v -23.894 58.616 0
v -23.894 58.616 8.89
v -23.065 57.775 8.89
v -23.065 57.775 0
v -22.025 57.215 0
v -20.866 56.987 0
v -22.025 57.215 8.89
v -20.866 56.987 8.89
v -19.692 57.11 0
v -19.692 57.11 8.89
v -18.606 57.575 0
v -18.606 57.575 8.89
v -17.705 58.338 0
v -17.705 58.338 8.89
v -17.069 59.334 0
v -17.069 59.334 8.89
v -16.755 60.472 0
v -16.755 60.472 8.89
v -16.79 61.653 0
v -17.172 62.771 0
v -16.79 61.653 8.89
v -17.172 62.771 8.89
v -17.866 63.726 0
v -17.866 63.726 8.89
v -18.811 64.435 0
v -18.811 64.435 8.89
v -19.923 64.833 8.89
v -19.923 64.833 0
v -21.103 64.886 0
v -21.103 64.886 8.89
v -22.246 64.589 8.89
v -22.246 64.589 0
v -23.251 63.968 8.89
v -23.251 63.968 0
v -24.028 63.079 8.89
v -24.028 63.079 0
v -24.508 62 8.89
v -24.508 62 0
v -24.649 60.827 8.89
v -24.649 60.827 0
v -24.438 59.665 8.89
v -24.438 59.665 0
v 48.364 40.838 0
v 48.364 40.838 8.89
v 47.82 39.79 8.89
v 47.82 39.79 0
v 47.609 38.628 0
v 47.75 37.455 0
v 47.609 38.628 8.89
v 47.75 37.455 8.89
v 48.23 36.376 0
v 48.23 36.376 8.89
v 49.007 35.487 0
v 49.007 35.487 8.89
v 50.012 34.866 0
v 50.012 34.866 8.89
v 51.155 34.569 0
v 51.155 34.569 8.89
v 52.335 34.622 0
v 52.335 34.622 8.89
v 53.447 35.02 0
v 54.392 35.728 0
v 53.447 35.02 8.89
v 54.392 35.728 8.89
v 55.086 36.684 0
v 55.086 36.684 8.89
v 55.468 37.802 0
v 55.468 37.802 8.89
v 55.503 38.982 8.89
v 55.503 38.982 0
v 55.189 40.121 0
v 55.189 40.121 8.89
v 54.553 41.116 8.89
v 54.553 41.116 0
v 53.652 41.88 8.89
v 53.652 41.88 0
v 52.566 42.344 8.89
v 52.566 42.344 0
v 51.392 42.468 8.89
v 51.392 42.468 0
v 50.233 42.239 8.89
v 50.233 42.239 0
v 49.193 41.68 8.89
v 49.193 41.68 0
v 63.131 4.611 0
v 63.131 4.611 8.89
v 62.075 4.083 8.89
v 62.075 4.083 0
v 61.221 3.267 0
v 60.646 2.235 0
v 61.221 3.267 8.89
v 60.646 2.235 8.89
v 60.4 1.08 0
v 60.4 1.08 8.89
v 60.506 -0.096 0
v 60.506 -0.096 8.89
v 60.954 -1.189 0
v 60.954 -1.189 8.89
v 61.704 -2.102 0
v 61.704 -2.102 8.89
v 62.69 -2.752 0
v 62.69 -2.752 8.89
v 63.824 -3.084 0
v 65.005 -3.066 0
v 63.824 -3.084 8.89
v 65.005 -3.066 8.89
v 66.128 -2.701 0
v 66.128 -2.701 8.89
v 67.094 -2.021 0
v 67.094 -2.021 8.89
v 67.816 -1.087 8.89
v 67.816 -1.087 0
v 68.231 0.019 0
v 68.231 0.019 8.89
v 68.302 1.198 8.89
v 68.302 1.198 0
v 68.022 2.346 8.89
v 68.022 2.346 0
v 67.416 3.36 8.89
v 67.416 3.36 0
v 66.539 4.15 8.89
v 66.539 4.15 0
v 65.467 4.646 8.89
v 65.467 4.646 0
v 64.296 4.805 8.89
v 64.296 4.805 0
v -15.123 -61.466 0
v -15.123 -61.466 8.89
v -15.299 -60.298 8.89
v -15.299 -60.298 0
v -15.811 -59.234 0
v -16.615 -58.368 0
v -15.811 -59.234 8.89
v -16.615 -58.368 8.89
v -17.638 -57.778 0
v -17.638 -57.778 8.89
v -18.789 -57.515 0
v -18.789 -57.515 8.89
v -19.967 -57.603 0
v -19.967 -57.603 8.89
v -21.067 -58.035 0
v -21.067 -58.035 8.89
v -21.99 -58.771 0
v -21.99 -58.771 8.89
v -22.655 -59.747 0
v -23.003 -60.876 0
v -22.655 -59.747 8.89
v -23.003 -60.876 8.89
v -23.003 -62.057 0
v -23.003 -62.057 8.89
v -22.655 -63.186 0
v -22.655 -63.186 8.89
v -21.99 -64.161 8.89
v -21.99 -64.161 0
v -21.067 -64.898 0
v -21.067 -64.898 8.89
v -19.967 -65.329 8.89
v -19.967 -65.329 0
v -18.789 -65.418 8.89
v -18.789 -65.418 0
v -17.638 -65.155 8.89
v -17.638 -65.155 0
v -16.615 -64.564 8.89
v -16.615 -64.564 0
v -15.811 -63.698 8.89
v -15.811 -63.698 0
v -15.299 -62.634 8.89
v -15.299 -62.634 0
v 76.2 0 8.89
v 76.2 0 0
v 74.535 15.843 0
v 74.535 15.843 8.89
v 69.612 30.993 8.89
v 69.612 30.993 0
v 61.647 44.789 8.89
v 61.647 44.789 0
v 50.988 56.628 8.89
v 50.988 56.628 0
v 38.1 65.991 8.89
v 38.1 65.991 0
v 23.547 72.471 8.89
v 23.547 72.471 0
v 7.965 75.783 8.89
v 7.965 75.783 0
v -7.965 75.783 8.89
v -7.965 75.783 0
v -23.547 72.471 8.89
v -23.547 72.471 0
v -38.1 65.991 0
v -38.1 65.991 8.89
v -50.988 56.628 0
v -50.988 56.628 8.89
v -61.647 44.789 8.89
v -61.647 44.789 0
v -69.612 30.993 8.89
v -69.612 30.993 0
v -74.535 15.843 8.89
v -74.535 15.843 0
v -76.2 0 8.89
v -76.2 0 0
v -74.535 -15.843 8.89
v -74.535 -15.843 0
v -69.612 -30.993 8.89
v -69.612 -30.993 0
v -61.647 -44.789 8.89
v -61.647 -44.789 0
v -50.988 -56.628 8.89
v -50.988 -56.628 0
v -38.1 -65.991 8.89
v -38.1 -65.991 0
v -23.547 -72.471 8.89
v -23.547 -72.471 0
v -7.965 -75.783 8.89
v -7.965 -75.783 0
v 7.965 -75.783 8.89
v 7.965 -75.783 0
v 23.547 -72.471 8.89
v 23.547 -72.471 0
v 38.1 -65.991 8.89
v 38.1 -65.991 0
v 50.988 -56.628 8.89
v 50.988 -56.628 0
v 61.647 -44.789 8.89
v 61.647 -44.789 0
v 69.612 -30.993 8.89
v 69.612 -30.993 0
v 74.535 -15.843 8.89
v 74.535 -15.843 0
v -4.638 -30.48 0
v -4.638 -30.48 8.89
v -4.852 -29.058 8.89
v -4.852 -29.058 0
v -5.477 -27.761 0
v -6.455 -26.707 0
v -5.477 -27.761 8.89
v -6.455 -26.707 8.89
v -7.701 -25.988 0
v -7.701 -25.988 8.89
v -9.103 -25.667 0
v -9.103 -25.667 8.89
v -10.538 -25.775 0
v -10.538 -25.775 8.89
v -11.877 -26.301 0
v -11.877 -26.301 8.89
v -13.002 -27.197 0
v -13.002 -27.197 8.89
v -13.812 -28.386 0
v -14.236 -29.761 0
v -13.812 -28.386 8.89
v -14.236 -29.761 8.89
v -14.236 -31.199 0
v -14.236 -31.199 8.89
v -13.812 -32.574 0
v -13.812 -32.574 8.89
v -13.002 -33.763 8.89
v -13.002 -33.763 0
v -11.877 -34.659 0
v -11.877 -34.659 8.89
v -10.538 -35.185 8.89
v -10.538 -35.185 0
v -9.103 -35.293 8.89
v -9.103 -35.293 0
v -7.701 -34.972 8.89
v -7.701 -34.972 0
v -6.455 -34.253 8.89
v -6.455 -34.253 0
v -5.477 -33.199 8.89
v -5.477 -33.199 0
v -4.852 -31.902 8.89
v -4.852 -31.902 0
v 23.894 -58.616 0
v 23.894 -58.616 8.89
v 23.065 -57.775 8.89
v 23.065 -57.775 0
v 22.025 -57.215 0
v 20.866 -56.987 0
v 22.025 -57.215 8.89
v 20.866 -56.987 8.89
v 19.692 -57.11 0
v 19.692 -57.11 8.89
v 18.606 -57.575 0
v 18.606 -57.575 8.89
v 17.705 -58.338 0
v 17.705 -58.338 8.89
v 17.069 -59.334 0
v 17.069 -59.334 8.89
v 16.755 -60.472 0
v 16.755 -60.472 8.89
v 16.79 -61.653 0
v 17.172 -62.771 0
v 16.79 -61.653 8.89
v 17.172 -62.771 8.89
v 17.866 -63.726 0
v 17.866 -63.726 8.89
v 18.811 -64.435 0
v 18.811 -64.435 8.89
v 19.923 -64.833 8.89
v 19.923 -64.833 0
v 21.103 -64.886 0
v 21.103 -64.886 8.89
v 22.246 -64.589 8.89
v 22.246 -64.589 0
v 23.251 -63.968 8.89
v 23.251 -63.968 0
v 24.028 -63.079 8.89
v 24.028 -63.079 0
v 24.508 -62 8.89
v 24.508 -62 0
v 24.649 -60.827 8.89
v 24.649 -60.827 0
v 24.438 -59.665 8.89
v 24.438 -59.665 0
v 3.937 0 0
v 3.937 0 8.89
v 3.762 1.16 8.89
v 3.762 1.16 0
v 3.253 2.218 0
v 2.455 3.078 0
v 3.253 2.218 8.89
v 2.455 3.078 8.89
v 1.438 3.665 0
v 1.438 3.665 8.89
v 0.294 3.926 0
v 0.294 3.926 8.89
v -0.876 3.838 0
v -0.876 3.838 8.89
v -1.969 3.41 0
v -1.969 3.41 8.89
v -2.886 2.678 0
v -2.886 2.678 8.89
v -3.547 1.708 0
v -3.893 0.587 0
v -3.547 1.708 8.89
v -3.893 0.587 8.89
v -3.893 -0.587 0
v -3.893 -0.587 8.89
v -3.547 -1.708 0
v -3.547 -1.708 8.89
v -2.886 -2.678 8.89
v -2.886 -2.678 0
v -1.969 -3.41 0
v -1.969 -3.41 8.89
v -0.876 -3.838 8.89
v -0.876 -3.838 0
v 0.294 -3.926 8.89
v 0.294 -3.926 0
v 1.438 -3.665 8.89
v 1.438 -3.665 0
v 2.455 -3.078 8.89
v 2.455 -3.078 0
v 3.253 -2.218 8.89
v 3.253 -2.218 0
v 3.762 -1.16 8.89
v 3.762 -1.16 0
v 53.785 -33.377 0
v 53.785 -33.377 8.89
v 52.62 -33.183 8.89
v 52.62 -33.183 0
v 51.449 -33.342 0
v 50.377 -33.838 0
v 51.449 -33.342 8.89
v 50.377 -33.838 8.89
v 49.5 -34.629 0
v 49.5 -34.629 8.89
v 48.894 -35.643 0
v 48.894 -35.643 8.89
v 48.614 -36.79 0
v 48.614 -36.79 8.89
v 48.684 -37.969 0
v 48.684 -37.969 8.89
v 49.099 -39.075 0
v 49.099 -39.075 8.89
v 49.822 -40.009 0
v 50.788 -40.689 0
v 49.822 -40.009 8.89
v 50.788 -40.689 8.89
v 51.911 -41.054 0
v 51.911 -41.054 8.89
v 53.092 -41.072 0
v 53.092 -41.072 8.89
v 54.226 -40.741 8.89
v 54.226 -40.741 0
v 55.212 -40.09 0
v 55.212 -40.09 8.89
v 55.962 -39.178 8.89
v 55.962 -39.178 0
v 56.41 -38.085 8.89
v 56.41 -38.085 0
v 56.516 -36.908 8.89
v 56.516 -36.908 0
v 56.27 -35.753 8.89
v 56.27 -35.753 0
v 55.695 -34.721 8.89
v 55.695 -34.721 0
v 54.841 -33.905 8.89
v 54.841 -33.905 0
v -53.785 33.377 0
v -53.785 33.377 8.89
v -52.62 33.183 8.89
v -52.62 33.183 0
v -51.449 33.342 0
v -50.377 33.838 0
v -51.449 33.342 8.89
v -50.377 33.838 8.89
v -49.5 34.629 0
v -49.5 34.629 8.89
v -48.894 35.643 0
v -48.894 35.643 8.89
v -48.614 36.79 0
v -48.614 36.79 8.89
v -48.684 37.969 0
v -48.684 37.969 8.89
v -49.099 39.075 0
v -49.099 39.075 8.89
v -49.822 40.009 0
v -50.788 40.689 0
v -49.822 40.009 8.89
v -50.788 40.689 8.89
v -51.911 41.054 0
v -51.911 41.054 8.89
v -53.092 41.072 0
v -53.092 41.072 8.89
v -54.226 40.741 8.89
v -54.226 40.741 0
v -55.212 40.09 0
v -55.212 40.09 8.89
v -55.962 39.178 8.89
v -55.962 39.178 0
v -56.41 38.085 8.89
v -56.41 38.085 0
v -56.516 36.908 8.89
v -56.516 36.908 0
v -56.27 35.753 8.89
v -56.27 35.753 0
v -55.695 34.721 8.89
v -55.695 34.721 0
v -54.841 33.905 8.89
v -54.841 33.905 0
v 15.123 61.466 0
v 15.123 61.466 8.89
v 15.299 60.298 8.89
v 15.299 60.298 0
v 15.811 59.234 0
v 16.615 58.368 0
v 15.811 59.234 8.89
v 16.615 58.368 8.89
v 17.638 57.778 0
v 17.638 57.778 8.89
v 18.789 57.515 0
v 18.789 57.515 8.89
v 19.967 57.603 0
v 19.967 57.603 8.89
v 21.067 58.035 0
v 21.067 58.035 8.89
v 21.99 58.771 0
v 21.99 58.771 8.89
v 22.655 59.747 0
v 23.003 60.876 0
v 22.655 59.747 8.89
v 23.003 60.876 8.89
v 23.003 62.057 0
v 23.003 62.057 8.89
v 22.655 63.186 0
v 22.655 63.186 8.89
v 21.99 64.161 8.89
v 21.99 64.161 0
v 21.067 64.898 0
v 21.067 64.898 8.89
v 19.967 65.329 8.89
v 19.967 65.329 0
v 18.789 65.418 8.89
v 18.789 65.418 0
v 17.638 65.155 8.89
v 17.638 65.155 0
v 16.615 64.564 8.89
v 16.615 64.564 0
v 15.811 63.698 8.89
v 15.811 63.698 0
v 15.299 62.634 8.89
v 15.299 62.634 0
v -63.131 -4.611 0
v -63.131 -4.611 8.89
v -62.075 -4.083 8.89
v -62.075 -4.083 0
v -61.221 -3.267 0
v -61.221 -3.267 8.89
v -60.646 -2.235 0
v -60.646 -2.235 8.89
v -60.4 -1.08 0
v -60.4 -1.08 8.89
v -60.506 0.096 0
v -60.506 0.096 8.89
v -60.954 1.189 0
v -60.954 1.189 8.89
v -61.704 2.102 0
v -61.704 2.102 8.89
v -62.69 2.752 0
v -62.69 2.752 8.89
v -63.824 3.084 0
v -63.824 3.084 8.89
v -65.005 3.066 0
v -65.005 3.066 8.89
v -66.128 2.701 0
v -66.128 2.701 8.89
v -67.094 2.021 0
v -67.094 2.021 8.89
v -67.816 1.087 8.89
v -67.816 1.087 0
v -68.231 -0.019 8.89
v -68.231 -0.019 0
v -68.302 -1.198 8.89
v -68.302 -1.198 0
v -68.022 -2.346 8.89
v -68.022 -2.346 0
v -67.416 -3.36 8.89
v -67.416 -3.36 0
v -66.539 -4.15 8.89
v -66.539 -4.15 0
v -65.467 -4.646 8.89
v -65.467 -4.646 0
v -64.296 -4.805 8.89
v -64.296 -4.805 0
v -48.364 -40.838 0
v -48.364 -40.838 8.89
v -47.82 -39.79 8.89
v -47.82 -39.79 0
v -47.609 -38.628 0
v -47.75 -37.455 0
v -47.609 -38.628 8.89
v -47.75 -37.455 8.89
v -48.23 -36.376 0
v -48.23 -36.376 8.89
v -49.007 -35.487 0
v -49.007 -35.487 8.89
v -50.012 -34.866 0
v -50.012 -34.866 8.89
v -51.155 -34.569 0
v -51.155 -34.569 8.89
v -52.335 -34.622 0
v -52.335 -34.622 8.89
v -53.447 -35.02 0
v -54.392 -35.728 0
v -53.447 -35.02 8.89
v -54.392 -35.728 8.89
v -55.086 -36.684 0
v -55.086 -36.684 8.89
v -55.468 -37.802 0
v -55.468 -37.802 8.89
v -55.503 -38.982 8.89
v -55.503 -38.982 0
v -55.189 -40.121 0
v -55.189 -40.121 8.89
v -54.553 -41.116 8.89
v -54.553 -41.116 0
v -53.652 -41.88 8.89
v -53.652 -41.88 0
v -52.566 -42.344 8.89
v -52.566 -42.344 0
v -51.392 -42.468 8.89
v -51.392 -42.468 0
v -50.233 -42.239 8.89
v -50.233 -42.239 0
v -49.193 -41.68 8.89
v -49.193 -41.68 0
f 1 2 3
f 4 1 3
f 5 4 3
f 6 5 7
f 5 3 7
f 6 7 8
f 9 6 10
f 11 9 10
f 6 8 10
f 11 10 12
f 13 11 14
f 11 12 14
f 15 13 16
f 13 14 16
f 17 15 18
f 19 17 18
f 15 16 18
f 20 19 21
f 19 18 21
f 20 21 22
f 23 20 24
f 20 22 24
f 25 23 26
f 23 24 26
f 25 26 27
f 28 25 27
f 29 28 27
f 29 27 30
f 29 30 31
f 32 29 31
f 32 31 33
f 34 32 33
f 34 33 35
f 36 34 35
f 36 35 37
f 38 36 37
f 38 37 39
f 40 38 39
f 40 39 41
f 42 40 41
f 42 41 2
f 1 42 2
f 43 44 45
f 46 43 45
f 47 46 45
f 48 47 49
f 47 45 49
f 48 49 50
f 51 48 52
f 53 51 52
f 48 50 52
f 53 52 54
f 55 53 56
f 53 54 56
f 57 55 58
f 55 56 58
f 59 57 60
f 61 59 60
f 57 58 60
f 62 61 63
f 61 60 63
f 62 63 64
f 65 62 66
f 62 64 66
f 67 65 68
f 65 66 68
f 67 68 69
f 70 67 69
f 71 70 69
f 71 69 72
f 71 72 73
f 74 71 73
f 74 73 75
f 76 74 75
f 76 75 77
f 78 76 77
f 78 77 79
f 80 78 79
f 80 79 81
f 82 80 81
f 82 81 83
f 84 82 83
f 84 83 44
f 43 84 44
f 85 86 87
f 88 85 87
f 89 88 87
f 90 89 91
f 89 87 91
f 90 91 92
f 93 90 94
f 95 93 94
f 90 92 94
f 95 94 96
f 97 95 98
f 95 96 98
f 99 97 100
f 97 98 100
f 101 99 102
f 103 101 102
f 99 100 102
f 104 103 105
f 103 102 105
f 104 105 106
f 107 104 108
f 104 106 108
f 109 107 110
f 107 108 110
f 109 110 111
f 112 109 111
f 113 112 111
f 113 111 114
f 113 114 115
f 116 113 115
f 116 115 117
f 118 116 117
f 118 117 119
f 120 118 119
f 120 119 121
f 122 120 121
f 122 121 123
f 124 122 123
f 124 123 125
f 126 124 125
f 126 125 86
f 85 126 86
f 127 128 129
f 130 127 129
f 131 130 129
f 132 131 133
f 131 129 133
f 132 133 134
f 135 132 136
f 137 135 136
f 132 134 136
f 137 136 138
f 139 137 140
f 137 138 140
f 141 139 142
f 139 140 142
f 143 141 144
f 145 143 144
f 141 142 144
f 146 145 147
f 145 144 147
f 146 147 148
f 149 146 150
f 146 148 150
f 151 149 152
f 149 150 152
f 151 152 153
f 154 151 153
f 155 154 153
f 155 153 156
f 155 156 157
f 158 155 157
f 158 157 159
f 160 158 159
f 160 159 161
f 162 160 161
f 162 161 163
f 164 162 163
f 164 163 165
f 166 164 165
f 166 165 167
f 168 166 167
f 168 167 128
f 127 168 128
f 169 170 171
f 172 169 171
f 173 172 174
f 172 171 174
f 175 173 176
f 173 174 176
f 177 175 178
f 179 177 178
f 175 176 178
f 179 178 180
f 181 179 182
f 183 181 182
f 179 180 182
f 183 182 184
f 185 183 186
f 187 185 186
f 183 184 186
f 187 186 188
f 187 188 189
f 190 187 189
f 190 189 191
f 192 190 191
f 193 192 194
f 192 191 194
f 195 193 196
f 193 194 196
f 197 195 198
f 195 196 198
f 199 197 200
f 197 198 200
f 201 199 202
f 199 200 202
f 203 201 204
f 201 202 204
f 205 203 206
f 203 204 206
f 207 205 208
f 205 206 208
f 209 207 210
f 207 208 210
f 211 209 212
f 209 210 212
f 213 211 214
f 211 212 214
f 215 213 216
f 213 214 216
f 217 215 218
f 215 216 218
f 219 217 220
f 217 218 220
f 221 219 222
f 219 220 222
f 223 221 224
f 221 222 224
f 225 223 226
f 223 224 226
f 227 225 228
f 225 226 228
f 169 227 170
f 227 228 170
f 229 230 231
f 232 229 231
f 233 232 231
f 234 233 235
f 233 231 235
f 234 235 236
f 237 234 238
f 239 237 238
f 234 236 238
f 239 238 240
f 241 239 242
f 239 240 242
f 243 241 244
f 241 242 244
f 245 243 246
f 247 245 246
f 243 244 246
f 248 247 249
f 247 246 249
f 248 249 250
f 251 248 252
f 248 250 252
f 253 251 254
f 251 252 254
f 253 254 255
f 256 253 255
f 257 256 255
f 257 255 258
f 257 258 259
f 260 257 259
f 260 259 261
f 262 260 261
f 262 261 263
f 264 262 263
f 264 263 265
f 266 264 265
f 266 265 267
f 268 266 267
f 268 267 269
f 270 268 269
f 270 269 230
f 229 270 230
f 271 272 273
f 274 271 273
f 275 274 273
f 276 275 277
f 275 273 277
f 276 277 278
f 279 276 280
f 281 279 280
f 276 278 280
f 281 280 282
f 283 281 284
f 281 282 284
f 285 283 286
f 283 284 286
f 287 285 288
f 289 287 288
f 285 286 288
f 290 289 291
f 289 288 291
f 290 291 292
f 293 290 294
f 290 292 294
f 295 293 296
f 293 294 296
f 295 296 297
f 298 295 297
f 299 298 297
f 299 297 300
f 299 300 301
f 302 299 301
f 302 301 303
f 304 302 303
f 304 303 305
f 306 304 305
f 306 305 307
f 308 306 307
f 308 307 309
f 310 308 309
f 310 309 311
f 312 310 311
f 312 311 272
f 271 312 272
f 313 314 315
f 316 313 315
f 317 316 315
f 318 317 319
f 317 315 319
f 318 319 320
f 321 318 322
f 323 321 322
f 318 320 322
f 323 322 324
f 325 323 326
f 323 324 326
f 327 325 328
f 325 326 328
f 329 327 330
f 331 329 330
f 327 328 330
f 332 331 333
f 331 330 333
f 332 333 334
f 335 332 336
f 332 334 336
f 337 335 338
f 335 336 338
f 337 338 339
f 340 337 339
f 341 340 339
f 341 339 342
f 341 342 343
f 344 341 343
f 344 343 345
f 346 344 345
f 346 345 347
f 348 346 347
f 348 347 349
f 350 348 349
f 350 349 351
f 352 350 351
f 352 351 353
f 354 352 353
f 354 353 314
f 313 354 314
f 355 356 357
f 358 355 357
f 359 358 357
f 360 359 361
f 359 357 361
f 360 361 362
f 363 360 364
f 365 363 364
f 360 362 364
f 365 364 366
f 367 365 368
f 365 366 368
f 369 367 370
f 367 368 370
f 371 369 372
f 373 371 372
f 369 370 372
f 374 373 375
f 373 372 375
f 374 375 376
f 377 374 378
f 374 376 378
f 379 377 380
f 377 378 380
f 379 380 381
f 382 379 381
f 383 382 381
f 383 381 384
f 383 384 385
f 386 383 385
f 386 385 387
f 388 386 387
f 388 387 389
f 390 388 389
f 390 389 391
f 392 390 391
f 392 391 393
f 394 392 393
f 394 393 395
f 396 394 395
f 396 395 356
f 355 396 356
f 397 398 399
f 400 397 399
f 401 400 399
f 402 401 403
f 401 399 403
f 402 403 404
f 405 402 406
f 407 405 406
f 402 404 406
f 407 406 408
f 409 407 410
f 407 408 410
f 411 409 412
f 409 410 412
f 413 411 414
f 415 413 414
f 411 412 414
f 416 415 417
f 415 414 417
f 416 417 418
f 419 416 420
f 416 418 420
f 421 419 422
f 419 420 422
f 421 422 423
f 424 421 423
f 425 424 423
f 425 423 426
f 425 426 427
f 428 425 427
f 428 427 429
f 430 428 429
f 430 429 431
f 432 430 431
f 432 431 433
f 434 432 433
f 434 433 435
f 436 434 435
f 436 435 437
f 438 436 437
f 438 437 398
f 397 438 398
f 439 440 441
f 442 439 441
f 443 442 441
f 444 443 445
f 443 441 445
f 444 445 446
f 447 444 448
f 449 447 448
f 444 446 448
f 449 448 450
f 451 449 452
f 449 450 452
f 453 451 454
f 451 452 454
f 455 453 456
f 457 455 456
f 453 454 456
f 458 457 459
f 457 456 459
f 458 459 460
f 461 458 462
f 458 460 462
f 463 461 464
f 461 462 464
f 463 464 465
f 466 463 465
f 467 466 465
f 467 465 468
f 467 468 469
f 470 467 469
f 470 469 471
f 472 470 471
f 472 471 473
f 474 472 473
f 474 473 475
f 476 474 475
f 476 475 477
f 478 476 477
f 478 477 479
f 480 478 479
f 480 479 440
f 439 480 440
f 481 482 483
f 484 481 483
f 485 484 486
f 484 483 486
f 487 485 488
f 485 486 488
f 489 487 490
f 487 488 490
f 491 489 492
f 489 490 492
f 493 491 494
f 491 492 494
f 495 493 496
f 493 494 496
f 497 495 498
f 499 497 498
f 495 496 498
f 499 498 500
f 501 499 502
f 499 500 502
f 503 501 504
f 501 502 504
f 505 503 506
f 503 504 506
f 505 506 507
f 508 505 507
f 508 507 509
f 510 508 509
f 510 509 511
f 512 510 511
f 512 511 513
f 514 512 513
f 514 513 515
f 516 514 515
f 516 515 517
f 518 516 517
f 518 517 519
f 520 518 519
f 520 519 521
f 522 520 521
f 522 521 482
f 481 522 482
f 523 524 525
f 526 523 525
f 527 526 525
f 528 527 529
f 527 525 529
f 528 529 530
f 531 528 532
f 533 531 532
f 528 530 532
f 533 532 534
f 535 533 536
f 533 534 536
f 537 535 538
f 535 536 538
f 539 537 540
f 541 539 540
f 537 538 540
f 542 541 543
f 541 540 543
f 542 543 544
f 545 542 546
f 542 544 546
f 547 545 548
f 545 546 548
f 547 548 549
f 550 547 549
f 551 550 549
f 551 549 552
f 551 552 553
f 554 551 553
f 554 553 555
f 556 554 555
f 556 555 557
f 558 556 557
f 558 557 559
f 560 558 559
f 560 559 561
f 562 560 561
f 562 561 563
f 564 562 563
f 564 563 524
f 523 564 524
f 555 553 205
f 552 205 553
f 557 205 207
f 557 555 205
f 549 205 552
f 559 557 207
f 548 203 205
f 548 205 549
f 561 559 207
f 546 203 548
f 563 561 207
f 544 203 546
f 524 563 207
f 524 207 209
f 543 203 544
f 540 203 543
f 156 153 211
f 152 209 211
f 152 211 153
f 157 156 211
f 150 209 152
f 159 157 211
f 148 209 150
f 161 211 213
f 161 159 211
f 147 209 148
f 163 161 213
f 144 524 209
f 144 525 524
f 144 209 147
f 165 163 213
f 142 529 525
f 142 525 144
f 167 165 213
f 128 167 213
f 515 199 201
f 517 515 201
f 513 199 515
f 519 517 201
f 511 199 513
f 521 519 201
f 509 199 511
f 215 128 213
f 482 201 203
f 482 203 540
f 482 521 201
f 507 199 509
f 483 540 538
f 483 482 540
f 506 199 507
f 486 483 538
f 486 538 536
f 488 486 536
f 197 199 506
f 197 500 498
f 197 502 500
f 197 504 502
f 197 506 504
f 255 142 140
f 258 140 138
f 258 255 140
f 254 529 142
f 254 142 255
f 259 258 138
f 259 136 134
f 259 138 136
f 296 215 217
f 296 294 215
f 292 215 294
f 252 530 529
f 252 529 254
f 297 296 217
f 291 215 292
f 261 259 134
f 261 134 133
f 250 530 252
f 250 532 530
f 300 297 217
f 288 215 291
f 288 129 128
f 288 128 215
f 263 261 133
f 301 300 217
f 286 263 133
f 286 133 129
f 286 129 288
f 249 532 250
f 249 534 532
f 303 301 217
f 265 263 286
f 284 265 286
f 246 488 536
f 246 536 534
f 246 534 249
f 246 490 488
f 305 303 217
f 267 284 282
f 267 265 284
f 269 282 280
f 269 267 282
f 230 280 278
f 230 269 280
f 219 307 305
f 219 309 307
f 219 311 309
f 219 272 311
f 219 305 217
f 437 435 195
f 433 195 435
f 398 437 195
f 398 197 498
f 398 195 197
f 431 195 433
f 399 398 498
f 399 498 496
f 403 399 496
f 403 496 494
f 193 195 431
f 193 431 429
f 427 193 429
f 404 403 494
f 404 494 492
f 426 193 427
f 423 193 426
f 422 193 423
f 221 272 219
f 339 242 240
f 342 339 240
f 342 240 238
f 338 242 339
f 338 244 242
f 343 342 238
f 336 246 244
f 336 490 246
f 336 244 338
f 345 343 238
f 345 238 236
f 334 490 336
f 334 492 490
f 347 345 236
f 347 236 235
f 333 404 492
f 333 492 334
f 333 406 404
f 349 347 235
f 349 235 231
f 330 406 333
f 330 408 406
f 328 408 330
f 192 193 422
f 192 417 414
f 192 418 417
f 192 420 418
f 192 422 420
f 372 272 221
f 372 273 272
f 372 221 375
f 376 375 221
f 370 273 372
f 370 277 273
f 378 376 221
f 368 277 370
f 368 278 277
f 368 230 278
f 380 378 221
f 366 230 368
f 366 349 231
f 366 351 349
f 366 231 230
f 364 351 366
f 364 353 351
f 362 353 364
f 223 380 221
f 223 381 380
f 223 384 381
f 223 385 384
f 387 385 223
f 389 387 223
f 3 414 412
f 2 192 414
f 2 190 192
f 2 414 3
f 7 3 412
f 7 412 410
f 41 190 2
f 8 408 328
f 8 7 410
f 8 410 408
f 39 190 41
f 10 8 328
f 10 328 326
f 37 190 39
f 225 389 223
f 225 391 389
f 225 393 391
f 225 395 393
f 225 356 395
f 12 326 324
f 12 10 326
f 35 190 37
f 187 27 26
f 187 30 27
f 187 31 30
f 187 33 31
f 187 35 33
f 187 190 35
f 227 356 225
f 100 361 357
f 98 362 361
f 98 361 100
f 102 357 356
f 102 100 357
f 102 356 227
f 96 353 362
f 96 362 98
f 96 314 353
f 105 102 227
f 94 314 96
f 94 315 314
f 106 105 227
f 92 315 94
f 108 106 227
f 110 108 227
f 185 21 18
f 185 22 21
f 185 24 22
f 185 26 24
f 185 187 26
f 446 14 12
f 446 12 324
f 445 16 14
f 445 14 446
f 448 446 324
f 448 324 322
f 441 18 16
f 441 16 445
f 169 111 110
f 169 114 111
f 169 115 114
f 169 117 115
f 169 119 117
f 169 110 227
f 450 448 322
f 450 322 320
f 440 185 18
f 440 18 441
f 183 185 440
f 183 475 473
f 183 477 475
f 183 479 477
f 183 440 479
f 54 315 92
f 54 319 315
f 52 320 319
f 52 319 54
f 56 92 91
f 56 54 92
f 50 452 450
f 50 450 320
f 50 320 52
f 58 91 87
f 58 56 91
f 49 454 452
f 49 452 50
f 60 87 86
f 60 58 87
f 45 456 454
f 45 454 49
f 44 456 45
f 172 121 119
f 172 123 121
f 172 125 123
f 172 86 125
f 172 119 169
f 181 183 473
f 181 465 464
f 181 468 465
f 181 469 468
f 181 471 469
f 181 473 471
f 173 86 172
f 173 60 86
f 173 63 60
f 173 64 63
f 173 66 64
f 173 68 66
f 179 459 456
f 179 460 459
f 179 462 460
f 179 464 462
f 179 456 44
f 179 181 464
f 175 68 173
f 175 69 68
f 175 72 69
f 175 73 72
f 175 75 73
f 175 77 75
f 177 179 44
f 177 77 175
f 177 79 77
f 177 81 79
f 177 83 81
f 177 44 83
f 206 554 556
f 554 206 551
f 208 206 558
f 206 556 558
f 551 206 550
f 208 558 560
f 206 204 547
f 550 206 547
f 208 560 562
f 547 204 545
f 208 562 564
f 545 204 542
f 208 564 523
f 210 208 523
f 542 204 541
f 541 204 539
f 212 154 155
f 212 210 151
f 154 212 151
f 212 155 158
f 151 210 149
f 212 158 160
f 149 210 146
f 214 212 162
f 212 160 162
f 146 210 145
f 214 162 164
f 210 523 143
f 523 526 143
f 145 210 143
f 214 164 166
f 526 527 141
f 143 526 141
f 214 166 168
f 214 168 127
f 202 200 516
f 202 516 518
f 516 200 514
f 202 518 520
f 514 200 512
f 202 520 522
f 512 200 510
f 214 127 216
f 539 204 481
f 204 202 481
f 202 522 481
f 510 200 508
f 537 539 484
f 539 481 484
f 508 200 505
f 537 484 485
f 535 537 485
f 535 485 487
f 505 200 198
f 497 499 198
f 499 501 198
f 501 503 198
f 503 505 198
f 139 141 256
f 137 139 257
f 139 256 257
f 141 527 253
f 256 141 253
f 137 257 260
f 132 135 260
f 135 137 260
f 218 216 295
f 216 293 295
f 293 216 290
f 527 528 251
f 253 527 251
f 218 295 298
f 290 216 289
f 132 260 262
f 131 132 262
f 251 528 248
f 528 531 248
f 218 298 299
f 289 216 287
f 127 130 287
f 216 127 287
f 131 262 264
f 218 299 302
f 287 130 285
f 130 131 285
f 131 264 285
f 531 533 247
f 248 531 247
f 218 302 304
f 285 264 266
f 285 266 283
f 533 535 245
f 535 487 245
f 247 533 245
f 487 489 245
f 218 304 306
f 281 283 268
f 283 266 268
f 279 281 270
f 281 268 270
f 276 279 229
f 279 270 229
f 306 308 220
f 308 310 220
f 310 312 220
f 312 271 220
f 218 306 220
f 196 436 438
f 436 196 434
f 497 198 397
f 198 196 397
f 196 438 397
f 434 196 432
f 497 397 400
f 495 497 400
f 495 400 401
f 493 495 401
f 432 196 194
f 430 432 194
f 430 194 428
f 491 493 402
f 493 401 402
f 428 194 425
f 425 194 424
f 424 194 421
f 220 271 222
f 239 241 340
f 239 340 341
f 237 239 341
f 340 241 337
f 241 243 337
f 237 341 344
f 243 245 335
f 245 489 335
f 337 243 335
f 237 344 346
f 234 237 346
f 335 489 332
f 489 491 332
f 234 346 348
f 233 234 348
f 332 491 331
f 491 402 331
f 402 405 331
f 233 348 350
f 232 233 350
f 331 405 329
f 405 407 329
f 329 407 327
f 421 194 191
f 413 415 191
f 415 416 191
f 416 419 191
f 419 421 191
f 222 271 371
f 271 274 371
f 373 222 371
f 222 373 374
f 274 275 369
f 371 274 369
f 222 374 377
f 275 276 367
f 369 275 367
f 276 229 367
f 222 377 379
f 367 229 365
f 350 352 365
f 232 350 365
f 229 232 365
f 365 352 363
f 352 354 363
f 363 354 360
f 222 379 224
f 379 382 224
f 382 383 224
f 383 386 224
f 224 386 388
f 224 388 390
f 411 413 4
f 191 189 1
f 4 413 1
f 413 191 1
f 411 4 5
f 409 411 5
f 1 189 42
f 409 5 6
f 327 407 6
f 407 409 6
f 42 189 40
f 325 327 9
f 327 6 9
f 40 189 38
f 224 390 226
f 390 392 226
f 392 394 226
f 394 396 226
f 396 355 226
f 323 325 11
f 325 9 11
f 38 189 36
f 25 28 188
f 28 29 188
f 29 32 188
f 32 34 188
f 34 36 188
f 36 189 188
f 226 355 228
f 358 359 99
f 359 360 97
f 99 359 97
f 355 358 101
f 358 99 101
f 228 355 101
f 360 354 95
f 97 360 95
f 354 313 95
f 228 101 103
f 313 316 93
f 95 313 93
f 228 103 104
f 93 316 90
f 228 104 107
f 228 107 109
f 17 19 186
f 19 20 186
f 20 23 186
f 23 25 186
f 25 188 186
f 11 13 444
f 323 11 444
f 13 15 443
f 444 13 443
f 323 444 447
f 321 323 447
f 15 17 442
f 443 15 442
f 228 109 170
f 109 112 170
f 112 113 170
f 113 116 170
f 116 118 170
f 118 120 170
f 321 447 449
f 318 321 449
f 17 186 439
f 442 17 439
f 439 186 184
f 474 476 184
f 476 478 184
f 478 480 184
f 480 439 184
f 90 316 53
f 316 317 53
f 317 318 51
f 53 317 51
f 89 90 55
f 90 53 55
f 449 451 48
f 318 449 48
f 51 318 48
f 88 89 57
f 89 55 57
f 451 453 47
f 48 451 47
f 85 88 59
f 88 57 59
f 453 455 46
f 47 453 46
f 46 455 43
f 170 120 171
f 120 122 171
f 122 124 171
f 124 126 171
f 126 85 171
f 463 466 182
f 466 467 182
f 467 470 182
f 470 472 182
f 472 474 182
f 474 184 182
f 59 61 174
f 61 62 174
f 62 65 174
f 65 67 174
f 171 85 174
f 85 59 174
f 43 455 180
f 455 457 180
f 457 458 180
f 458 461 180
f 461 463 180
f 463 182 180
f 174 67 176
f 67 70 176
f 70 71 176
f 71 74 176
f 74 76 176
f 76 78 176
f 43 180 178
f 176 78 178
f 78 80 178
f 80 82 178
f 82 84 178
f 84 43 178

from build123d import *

# Parameters (mm, degrees)
F0_R            = 76.2
F1_DEPTH        = 8.89
F2_R            = 3.937
F3_DEPTH        = 25.4
F4_R            = 4.826
F5_DEPTH        = 25.4
F6_R            = 3.9624
F7_DEPTH        = 25.4
F7_COPIES_COUNT = 10


# Not quite as in the source:
# - a pattern or mirror of a feature is missing from the dataset's text; its kind, count and spacing are read off the source's solid


with BuildPart() as f1:
    # F0 (on Top) → F1 (new body)
    with BuildSketch(Plane.XY):
        Circle(F0_R)
    extrude(amount=F1_DEPTH)

    # F2 (on face) → F3 (cut)
    with BuildSketch(Plane.XY.offset(8.89)):
        Circle(F2_R)
    extrude(amount=-F3_DEPTH, mode=Mode.SUBTRACT)

    # F4 (on face) → F5 (cut)
    with BuildSketch(Plane.XY.offset(8.89)):
        with Locations((-9.46404, -30.48)):
            Circle(F4_R)
    extrude(amount=-F5_DEPTH, mode=Mode.SUBTRACT)

    # F6 (on face) → F7 (cut)
    with BuildSketch(Plane.XY.offset(8.89)):
        with Locations((-19.085301976, -61.4663509693)):
            Circle(F6_R)
    f7 = extrude(amount=-F7_DEPTH, mode=Mode.SUBTRACT)

    # F7_copies: F7 ×10 about axis
    f7_copies_axis = Axis((0, 0, 0), (0, 0, 1))
    for i in range(1, F7_COPIES_COUNT):
        add(f7.rotate(f7_copies_axis, i * 360 / F7_COPIES_COUNT), mode=Mode.SUBTRACT)


solid = f1.part
